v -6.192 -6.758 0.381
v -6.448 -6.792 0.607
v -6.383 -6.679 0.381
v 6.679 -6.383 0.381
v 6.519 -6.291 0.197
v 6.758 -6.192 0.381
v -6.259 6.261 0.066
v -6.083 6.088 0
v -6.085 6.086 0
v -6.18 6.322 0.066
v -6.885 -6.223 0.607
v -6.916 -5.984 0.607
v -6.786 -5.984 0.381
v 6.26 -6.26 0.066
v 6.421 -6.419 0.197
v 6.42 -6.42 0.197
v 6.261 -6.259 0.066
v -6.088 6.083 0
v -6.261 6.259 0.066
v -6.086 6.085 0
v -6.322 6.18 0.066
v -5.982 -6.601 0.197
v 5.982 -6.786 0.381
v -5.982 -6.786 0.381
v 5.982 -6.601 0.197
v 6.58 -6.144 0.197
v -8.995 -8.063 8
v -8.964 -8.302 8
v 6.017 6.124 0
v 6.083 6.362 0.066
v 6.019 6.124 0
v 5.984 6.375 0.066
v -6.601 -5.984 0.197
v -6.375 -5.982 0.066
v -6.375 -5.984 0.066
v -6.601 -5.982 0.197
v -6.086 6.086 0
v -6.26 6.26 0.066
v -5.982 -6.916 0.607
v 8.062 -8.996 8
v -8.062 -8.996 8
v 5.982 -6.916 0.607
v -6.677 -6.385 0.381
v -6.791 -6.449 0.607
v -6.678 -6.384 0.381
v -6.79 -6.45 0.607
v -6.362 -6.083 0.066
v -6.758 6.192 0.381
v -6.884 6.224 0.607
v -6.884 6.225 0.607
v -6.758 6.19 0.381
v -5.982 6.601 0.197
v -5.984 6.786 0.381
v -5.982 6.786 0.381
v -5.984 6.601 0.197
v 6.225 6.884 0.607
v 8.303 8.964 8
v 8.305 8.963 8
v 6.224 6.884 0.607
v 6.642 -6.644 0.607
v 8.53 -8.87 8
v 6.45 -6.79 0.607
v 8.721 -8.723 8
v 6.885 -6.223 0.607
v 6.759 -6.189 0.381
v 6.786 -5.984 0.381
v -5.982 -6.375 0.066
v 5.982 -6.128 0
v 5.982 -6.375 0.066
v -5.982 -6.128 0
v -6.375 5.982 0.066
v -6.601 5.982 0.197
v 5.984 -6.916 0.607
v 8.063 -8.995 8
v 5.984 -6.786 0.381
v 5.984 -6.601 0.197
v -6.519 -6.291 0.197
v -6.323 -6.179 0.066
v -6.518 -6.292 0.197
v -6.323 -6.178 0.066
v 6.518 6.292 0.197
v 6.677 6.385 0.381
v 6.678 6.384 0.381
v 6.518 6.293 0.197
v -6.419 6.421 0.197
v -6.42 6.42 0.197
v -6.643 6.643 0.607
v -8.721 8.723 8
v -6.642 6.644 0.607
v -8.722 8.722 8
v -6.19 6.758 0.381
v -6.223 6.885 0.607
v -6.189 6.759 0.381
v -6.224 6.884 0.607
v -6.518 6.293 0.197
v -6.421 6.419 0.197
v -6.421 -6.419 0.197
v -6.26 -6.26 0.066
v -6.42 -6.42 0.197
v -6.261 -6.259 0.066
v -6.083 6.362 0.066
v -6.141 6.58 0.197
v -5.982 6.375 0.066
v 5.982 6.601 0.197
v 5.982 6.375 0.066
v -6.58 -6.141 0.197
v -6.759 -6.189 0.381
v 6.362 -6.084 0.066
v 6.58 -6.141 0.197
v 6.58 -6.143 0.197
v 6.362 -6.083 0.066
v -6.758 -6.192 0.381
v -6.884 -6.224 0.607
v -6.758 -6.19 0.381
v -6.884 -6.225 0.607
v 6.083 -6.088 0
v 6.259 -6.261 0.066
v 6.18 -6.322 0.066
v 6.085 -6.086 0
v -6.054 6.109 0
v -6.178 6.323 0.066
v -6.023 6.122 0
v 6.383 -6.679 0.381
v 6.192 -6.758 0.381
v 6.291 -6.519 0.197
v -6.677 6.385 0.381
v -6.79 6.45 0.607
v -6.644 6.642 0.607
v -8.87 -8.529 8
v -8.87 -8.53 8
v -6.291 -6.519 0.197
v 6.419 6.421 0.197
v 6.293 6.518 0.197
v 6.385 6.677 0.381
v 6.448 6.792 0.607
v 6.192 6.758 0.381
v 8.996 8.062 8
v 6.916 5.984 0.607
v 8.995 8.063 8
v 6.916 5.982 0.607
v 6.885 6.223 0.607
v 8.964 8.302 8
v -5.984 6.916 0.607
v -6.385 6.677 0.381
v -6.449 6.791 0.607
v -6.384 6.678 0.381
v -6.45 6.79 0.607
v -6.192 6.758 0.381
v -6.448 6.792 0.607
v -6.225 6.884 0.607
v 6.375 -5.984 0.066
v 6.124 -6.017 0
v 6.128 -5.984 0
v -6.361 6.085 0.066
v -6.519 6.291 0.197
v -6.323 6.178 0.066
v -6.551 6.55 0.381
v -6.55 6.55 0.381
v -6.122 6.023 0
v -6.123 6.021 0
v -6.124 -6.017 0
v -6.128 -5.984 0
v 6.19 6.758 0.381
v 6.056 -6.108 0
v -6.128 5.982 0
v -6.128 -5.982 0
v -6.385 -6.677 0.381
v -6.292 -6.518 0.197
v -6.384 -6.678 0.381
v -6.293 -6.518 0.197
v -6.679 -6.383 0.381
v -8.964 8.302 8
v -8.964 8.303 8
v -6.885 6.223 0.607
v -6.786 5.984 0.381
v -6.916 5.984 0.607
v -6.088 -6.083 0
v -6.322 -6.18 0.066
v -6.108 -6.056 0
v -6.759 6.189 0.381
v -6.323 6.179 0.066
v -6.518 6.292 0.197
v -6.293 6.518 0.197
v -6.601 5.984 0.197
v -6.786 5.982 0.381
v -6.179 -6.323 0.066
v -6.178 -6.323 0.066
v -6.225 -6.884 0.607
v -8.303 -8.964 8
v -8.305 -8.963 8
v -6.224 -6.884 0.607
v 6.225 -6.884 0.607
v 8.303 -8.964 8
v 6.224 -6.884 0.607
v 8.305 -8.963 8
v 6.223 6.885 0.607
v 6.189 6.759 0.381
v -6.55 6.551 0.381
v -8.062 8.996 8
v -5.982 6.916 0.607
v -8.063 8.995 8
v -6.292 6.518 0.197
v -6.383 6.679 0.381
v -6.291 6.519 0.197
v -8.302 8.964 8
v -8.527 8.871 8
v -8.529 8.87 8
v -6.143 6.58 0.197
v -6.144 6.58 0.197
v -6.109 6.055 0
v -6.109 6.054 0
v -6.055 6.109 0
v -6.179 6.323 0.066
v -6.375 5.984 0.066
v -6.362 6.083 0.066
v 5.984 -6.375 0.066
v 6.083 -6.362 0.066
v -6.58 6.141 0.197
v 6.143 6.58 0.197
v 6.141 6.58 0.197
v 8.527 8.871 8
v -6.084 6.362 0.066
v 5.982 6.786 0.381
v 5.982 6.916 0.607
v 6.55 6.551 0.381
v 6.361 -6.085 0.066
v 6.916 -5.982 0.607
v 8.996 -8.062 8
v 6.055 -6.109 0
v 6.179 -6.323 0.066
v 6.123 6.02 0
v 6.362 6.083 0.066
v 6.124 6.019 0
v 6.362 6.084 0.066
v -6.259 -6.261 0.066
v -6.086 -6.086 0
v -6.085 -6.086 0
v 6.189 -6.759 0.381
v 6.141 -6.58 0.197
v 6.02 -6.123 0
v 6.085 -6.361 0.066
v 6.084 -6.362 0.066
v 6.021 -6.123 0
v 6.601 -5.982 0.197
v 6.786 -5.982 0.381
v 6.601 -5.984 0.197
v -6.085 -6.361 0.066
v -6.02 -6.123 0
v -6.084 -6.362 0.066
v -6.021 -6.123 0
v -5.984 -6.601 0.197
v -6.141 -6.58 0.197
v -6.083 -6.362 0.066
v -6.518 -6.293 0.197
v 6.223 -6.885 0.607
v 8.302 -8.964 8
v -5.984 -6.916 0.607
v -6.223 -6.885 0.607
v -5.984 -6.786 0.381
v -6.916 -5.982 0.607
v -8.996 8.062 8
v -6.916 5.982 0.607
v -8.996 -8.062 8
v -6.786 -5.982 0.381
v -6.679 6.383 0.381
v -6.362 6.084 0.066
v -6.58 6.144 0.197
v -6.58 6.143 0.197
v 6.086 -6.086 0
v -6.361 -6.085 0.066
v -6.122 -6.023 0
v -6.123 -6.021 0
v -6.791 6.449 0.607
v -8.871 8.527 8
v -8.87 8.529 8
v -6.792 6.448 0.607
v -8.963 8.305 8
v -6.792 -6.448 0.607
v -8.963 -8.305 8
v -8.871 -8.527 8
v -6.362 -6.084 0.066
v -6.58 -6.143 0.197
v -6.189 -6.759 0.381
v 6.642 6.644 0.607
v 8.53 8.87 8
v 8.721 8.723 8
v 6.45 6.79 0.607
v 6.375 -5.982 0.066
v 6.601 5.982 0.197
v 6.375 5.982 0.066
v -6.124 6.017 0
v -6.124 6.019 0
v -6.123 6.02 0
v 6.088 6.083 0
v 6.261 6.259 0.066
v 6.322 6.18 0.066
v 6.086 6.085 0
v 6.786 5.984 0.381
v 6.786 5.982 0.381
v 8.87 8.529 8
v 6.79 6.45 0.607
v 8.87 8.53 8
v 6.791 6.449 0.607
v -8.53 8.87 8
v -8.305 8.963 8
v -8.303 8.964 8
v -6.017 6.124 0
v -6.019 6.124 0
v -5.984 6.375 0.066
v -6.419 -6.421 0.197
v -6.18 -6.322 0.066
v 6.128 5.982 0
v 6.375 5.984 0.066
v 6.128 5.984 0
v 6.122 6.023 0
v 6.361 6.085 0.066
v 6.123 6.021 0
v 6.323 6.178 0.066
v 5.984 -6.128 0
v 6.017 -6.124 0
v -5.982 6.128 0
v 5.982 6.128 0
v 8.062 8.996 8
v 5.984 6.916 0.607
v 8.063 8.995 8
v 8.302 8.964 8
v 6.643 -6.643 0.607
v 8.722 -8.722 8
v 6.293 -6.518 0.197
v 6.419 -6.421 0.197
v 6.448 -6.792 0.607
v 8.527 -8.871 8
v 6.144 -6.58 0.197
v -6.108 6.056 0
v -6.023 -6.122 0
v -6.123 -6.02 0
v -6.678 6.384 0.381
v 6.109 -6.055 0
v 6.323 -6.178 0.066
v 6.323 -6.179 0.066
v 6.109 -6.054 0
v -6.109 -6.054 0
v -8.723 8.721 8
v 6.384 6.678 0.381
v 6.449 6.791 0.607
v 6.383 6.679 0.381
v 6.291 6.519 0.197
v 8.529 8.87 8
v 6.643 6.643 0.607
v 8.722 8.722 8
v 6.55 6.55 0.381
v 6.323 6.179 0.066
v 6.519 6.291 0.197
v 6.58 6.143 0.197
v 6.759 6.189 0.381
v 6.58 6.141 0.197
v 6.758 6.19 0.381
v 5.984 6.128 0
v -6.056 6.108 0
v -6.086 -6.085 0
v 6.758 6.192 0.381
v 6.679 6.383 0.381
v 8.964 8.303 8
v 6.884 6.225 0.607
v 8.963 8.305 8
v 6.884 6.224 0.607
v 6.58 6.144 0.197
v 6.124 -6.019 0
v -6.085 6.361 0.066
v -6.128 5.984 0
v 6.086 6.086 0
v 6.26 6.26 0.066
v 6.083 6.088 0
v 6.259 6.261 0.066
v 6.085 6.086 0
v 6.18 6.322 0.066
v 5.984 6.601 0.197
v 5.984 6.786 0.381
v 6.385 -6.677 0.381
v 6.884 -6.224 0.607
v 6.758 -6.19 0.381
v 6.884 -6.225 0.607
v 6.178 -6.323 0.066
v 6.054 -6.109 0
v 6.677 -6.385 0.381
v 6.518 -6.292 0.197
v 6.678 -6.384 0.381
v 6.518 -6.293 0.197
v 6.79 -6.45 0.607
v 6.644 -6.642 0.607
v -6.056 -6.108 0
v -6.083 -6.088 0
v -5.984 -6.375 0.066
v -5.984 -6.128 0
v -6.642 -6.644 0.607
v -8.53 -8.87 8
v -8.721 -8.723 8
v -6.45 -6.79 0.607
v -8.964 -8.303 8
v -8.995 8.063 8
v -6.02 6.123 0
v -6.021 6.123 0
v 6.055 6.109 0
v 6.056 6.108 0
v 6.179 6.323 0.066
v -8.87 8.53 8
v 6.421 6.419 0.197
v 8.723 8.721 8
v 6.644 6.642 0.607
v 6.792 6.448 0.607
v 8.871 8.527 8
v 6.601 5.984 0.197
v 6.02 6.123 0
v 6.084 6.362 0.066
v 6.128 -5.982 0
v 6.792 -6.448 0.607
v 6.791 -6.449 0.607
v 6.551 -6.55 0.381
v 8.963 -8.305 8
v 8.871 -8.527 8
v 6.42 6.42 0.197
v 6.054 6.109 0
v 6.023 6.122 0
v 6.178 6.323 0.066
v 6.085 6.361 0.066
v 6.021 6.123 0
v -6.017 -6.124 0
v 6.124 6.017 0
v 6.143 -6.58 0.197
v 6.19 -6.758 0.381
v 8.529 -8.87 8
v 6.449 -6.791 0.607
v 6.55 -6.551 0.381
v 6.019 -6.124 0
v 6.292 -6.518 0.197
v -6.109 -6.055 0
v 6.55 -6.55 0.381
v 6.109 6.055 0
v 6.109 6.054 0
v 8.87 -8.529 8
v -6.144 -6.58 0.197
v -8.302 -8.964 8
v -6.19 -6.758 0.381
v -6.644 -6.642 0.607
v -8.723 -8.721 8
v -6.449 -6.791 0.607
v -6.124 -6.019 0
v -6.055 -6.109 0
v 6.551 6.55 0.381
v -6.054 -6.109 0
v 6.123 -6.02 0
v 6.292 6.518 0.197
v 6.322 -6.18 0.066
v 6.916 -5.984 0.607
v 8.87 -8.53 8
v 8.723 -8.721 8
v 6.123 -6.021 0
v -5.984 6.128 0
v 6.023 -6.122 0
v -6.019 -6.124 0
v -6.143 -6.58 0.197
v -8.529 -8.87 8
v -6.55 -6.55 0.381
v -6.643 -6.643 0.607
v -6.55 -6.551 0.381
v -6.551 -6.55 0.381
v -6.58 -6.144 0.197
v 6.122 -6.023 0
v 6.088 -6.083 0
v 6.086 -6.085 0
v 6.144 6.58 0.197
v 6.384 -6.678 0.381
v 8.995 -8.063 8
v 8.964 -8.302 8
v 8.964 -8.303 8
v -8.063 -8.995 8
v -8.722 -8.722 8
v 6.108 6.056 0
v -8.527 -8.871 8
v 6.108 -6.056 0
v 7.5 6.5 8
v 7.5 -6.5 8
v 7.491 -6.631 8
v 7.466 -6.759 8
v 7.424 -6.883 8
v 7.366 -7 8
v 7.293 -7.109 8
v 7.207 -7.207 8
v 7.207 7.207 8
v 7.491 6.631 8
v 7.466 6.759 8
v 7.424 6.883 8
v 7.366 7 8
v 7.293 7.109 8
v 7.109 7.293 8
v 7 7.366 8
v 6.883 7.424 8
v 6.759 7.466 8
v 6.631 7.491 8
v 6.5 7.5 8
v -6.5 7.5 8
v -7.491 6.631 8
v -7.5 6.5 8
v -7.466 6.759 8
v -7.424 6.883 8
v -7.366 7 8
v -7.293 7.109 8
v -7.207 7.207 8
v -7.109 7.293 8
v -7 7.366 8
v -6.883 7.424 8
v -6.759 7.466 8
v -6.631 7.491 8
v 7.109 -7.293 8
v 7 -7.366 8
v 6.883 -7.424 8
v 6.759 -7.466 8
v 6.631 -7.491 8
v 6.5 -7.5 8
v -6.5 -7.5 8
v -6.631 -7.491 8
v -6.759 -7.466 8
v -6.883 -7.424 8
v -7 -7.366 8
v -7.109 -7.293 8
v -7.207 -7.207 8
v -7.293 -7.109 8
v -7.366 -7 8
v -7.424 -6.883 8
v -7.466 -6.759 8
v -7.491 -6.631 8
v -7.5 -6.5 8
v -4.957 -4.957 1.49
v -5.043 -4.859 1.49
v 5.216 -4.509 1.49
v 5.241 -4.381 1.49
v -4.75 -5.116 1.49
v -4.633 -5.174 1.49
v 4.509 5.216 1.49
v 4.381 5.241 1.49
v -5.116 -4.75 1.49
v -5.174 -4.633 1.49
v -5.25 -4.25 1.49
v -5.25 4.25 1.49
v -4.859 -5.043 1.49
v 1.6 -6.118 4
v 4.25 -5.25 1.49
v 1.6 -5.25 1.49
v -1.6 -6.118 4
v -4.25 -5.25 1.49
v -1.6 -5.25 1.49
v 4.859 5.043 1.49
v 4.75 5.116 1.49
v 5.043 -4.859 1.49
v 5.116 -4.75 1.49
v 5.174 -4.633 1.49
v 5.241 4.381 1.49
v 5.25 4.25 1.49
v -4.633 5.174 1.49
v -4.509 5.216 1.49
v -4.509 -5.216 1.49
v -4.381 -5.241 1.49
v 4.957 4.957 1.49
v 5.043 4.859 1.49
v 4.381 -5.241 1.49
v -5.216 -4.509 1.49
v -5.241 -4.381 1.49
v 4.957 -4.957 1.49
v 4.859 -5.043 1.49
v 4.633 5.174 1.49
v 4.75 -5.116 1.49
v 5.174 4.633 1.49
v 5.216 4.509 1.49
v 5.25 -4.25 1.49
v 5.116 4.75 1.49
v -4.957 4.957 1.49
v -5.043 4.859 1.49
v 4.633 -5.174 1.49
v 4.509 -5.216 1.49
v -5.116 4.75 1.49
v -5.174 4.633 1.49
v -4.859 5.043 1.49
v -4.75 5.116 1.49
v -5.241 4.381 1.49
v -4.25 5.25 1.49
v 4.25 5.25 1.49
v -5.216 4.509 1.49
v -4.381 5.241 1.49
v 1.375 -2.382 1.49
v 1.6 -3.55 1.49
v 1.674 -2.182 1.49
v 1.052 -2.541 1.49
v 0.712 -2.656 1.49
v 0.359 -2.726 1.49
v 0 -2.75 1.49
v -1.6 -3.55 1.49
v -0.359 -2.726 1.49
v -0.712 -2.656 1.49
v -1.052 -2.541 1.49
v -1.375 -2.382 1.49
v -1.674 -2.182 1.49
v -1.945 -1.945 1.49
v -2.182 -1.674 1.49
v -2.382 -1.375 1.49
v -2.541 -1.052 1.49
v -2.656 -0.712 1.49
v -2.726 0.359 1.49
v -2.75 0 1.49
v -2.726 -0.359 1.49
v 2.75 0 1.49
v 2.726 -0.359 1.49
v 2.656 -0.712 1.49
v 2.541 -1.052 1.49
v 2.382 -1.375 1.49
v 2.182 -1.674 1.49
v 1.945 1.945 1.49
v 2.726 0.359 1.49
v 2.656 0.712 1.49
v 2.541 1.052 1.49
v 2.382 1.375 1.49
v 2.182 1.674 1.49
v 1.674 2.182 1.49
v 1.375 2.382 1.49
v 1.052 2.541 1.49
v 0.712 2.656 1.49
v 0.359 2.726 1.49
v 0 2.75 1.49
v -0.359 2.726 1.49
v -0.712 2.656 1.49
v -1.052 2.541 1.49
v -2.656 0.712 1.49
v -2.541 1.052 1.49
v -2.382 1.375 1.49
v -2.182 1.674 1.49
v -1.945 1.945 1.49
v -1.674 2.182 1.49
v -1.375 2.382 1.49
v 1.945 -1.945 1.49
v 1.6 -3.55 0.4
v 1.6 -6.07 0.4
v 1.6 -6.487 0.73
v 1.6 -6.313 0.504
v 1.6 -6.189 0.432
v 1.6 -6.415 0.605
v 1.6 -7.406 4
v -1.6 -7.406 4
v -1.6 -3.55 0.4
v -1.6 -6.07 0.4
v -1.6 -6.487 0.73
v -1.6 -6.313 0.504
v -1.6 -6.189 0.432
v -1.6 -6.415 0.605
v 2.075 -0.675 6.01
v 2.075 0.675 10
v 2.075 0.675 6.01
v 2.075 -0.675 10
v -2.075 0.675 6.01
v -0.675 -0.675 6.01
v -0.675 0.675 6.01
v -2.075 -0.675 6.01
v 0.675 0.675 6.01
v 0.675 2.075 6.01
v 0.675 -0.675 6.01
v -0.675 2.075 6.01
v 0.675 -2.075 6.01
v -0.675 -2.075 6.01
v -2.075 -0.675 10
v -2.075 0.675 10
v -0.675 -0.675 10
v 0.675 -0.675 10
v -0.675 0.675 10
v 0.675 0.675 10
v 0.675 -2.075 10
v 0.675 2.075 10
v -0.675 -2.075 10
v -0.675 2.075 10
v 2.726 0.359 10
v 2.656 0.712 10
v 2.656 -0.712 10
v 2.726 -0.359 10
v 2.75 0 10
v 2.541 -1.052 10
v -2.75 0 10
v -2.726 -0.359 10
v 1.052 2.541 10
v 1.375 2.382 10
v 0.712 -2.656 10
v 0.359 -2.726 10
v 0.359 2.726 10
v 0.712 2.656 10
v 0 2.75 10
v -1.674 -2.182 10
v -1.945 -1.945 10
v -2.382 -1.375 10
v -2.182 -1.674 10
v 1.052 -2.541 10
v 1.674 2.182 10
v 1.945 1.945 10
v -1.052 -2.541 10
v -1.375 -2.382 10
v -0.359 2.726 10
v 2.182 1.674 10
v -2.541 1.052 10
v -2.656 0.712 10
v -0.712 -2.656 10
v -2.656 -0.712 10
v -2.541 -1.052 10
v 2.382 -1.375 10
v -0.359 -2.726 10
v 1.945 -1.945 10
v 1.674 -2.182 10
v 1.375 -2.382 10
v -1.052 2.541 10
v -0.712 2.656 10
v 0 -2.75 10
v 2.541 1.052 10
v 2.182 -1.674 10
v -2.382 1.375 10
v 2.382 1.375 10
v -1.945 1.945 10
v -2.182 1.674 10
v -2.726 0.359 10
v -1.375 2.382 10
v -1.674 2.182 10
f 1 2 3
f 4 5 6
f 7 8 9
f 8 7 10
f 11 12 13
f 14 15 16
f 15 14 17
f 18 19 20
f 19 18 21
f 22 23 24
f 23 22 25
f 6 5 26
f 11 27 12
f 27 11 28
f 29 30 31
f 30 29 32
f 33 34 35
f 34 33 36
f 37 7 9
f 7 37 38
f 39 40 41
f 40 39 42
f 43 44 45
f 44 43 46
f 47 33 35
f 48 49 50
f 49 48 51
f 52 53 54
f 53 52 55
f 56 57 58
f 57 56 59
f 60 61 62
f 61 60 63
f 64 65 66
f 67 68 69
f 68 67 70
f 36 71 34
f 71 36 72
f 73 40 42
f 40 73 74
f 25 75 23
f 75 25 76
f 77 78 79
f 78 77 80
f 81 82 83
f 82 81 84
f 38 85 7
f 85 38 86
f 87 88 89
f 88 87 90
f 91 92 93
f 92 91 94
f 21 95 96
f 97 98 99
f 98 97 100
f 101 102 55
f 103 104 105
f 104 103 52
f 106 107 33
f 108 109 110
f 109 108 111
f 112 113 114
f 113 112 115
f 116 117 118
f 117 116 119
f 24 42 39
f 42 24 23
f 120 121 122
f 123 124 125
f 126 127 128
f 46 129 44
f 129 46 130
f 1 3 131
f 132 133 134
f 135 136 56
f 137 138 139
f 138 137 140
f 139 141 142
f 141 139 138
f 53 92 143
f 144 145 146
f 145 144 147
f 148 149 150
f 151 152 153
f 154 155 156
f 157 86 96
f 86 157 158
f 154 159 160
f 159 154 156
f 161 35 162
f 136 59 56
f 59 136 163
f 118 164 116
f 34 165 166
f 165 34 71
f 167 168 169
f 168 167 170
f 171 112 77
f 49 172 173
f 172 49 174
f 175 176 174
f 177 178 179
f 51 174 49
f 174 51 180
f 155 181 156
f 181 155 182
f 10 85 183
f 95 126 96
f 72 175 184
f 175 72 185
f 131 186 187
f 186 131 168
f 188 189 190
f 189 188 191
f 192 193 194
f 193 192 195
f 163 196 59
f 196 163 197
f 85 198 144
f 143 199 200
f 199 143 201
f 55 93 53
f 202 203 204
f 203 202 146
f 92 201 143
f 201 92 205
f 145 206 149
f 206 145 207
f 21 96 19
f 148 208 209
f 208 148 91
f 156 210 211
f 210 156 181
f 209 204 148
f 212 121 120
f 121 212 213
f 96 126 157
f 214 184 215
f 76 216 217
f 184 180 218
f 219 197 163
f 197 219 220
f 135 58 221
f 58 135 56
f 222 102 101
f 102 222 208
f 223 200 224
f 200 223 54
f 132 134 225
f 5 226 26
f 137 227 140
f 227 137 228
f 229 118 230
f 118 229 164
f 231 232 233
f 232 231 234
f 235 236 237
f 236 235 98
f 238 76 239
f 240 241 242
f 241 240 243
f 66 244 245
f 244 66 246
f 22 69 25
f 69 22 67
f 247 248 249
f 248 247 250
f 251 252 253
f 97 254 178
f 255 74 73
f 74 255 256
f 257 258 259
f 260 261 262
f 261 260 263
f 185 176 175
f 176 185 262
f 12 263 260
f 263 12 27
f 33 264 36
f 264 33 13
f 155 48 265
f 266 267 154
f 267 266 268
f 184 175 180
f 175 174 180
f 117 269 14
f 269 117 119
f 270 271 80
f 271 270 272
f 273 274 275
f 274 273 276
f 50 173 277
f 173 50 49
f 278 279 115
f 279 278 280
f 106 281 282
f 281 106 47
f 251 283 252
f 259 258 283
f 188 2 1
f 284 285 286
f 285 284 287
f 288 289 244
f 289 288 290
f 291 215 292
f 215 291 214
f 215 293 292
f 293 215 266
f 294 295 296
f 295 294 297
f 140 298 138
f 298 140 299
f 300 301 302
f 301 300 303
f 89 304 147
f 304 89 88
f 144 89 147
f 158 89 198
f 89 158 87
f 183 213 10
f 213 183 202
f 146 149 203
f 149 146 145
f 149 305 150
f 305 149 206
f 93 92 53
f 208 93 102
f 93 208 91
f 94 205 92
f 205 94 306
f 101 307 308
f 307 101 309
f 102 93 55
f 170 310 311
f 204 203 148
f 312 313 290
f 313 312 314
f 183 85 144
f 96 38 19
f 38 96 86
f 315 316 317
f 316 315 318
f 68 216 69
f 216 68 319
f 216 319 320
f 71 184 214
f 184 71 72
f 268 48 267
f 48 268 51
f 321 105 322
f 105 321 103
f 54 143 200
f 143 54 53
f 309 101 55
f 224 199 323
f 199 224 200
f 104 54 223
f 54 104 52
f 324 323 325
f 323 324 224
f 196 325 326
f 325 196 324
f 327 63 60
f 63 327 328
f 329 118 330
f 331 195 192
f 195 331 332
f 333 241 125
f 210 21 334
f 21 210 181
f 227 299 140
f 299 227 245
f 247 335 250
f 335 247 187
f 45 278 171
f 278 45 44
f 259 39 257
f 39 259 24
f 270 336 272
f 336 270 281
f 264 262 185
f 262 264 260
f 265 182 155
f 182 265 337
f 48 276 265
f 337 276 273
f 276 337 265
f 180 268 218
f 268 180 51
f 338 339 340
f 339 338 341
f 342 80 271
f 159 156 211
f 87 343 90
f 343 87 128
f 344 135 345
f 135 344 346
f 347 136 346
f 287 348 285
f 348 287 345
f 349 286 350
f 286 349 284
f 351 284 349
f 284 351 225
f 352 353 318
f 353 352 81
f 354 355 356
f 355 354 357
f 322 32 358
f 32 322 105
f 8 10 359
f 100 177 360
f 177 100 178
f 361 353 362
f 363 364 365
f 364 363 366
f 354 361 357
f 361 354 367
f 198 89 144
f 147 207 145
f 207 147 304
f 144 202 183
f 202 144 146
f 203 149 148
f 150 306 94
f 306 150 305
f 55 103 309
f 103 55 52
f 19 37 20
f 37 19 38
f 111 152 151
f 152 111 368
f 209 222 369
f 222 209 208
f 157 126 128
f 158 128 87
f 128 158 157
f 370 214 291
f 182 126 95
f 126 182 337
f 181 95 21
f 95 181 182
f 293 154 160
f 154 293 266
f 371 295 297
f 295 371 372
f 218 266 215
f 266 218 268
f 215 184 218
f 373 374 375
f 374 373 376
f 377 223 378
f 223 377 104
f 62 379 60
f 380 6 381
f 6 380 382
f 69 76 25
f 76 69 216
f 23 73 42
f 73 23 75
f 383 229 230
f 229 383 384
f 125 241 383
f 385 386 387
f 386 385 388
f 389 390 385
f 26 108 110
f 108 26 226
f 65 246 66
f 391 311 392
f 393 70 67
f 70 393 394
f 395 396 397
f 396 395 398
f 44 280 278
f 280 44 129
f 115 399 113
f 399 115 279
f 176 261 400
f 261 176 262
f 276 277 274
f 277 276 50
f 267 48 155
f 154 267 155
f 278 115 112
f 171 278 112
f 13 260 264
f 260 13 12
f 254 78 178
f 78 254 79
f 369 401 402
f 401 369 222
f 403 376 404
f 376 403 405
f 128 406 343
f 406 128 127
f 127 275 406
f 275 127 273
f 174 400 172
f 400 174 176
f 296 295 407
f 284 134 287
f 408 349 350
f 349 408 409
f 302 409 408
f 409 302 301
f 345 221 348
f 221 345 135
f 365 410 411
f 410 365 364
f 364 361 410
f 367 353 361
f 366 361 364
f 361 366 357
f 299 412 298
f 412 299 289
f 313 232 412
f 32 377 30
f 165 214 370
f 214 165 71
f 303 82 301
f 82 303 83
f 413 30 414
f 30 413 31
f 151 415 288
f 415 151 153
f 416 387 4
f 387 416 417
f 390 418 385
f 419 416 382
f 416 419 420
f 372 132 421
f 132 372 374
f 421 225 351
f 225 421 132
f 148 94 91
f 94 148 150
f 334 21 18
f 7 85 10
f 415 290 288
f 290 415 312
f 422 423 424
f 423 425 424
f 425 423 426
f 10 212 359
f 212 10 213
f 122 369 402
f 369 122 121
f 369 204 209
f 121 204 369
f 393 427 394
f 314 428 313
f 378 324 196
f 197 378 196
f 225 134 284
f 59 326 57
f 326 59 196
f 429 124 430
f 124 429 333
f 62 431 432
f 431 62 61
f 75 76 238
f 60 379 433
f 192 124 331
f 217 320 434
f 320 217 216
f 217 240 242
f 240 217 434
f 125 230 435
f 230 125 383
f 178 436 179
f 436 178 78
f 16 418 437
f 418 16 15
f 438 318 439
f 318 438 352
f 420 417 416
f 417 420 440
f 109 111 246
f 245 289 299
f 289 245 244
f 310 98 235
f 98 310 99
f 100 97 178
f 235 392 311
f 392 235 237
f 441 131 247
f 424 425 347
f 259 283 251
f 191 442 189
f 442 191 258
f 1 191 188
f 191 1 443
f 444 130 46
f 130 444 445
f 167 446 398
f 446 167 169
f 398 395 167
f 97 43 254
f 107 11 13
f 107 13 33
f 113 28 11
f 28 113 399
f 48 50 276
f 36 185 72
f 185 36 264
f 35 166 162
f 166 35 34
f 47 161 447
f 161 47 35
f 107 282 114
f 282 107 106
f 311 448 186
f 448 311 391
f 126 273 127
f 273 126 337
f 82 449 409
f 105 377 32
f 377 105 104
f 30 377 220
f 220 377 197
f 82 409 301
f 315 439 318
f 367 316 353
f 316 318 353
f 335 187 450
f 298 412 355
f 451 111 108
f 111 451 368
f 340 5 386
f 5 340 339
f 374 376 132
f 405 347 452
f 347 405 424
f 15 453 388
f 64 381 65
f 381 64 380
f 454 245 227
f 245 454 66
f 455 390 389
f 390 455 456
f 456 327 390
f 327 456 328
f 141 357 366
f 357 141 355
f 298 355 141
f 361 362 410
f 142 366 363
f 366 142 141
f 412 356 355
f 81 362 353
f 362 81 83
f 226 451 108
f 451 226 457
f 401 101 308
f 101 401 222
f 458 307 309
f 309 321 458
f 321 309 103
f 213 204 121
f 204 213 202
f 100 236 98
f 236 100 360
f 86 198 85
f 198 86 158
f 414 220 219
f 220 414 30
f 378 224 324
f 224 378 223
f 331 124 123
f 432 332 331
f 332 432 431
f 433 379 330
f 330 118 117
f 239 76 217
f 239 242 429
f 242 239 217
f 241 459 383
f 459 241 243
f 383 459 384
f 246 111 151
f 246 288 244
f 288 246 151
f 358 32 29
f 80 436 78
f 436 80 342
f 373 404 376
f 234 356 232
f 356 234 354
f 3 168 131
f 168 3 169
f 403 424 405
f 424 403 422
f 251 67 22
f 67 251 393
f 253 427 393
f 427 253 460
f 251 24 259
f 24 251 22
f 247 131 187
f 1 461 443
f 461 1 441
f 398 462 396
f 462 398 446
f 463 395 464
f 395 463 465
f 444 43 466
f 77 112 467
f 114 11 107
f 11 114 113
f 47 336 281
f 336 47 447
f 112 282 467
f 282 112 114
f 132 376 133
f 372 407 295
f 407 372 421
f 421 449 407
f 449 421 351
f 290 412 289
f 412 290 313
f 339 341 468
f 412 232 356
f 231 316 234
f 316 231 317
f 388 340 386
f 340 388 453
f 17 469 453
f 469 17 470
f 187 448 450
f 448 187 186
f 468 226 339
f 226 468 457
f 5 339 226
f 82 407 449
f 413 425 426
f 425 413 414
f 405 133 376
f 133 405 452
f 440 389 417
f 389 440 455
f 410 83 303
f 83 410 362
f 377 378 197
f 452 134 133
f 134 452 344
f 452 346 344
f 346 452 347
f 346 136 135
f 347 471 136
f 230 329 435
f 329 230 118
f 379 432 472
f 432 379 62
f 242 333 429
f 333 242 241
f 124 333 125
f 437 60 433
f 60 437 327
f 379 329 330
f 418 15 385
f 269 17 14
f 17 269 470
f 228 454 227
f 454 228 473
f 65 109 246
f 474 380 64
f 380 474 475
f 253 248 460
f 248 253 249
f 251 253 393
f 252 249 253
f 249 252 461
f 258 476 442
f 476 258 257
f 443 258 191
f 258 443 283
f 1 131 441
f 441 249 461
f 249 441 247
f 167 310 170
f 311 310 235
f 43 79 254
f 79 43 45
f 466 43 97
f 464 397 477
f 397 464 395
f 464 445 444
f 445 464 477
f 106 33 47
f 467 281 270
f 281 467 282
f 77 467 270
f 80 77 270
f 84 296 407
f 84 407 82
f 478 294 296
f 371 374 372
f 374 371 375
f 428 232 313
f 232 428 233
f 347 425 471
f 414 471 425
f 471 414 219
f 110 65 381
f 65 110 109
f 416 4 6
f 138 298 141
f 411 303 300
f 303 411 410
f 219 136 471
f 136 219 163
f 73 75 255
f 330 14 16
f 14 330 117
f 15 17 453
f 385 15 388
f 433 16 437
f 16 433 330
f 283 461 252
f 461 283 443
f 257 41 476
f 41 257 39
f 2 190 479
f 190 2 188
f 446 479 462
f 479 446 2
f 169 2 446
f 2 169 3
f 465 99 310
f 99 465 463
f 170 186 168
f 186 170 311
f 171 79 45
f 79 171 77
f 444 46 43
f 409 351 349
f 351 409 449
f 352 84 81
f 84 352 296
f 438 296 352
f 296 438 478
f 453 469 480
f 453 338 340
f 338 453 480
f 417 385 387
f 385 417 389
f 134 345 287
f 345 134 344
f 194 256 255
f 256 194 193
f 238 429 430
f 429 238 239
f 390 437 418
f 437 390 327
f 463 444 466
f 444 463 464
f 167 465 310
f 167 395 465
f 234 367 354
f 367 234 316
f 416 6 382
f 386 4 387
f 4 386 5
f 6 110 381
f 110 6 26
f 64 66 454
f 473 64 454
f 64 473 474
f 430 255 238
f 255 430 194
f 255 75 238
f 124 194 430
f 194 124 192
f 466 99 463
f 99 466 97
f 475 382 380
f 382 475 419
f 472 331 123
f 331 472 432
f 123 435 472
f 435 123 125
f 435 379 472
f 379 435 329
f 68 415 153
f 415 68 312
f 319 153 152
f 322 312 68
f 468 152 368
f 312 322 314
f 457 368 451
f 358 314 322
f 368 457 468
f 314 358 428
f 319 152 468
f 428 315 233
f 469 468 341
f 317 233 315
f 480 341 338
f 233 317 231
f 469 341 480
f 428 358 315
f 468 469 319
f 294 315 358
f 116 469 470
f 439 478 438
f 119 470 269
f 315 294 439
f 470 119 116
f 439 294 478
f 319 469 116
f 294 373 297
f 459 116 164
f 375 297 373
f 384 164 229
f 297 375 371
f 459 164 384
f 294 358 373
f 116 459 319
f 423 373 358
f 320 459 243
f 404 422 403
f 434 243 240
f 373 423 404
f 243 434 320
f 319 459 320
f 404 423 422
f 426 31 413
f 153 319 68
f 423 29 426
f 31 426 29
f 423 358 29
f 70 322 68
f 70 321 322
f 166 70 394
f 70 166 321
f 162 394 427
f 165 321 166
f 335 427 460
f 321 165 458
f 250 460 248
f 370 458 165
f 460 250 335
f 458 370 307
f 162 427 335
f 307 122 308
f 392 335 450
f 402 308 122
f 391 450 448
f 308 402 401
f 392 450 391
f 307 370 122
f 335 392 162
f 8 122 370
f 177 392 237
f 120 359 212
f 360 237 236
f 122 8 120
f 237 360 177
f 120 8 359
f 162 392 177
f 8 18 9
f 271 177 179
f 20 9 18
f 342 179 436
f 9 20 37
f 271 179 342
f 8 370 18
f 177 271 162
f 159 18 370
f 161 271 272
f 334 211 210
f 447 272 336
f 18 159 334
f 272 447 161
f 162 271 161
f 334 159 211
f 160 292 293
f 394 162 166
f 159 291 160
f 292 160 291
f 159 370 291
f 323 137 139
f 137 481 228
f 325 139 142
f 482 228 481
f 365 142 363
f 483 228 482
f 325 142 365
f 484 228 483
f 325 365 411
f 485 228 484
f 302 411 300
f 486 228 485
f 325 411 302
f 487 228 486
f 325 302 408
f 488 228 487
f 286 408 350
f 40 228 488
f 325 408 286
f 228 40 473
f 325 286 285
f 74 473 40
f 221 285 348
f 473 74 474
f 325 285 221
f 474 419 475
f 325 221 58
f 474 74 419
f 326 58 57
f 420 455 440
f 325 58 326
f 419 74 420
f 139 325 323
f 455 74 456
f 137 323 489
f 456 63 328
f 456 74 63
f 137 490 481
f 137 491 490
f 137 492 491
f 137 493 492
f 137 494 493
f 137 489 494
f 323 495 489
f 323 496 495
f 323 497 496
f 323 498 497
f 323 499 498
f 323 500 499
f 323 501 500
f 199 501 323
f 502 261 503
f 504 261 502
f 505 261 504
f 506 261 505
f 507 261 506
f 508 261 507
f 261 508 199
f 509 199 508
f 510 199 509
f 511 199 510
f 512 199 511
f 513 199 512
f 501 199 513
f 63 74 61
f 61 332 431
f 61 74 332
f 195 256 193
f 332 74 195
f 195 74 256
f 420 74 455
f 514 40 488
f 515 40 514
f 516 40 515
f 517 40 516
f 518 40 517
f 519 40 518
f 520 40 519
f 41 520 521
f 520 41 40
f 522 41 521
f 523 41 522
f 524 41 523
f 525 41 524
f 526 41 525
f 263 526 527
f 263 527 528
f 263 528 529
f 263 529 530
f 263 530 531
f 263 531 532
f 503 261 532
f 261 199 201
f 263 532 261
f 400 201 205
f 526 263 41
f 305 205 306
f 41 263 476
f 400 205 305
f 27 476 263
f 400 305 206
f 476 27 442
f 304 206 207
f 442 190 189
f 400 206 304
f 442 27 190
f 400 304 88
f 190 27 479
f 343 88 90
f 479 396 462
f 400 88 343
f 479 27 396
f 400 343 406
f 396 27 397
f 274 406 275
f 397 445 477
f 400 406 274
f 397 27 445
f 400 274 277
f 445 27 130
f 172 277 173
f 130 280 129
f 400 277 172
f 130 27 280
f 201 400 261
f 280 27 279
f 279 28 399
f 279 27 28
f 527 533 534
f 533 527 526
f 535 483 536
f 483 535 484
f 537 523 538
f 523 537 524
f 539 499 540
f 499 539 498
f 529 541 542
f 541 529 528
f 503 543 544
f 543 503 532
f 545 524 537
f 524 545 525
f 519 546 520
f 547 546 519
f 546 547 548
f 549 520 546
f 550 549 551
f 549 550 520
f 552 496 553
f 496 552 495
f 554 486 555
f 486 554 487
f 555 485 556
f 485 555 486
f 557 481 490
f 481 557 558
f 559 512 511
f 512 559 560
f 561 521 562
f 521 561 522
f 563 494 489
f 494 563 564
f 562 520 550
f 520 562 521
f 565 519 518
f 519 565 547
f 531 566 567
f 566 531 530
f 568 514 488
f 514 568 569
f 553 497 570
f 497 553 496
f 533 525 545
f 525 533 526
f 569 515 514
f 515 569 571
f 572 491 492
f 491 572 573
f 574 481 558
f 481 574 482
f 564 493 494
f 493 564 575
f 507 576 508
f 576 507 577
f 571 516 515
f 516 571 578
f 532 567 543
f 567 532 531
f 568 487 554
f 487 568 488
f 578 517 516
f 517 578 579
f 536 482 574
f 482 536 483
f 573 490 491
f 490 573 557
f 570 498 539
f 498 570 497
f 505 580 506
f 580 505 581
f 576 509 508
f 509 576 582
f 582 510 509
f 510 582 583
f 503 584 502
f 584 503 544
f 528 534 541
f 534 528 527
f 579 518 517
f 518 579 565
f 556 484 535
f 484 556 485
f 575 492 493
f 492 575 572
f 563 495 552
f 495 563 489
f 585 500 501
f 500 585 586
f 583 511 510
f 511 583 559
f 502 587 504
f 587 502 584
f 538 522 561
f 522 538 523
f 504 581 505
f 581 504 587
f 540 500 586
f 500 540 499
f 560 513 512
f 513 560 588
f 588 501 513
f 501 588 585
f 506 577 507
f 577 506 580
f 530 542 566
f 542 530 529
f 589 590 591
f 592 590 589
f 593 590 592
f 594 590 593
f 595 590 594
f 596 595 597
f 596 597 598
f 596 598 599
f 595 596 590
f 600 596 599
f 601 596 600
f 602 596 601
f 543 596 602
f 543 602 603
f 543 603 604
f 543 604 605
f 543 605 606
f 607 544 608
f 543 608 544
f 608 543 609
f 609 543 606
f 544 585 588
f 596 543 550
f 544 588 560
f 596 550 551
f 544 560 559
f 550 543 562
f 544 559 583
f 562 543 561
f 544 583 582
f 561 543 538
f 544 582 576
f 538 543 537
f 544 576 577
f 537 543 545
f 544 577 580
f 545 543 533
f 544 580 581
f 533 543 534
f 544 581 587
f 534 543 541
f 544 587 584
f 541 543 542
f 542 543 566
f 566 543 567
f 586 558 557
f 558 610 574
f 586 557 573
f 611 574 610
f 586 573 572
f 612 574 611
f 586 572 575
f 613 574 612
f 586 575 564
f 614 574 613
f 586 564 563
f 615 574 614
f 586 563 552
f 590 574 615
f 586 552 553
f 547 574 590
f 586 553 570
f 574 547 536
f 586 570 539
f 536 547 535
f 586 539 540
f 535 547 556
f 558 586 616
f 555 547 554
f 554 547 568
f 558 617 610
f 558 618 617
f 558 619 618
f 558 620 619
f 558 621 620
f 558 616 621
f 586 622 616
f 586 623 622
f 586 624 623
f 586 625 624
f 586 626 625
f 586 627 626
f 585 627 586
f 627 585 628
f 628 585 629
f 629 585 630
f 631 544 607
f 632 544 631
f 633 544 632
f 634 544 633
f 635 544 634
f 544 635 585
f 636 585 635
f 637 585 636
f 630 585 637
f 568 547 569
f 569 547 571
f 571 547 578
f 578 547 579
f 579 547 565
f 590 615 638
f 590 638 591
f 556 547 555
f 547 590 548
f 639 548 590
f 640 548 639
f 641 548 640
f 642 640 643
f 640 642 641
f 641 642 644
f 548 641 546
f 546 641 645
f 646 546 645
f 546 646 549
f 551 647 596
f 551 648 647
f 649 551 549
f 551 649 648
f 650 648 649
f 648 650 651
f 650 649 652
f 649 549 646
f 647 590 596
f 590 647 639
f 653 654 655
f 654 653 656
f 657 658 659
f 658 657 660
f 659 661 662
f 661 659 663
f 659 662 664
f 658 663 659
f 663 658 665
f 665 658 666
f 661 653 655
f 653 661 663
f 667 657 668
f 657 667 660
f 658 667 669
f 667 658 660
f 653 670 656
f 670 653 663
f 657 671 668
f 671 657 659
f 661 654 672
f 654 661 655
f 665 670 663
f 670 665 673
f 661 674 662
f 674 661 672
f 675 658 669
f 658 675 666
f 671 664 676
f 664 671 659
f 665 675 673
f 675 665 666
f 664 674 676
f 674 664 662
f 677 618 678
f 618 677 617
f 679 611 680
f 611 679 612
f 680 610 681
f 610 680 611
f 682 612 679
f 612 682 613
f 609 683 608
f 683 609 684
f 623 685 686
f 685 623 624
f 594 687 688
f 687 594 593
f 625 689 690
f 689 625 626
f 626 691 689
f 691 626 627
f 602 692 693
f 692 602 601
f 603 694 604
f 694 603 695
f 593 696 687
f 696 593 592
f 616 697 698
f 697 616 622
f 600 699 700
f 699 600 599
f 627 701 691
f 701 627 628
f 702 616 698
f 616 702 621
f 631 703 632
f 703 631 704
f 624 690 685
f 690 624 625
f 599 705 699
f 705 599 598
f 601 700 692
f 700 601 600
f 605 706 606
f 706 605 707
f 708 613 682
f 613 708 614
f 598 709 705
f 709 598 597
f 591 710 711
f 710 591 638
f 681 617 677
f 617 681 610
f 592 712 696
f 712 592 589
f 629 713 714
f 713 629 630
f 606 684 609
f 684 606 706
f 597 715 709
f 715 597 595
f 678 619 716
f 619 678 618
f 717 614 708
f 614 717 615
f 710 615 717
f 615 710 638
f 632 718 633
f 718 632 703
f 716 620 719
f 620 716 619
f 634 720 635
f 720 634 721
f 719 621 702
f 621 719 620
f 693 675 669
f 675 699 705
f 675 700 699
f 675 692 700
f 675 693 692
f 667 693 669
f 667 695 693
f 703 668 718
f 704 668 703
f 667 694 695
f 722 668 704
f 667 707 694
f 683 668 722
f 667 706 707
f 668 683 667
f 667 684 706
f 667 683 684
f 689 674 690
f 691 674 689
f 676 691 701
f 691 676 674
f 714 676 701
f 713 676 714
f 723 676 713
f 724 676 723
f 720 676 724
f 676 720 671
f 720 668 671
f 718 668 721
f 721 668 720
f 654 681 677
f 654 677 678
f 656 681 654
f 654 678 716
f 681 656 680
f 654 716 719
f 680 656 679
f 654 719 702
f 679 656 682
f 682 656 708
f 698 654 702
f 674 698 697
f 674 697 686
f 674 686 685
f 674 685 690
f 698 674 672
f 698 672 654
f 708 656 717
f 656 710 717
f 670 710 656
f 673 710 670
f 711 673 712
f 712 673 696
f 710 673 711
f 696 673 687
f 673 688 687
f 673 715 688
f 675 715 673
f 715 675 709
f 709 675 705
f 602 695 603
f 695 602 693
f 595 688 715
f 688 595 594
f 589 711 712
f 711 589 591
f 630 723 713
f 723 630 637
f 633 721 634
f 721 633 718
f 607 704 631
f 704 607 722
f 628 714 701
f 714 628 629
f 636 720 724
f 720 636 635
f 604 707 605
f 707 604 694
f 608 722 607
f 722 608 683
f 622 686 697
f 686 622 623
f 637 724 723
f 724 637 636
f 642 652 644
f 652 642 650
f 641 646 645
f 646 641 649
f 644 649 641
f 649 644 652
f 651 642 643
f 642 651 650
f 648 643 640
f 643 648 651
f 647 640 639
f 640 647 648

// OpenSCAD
// Parametrische MX-Keycap mit seitlichem LED-Fenster und verlängertem Stem
// Druck: Oberseite nach unten aufs Bett legen (Stem zeigt nach oben).
//
// part = "body"   -> Kappe (Fenster ausgespart)
// part = "insert" -> nur das Fenster-Stück (in klarem/weißem Filament drucken)
// part = "both"   -> beides zusammen (Vorschau)
// Multi-Material: body + insert als zwei Teile eines Objekts in den Slicer laden.
// Ohne Multi-Material: nur "body" drucken -> Fenster bleibt offen.


// EXPORT:
// openscad -o keycap_body.stl   -D 'part="body"'   keycap.scad
// openscad -o keycap_insert.stl -D 'part="insert"' keycap.scad

part = "both"; // [both, body, insert]

$fn = 48;

/* [Außenform] */
bottom     = 18.0;  // Kantenlänge unten (mm)  – bitte nachmessen
top        = 13.5;  // Kantenlänge Oberseite (mm) – bitte nachmessen
height     = 8.0;   // Höhe Unterkante Rand bis Oberseite (mm)
corner_r   = 1.0;   // Eckenradius
wall       = 1.5;   // Wandstärke
top_thick  = 1.5;   // Deckelstärke
top_r      = 1.0;   // Rundung Kante Oberseite/Schrägen (0 = eckig, max. ~corner_r)

/* [Fenster (an +Y-Kante)] */
win_w      = 3.2;   // Breite des Streifens
win_in     = 3.2;   // wie weit es in die Oberseite reicht (ab Oberkante der Schräge)
win_frac   = 0.5;   // Anteil der Wandhöhe (von oben), den das Fenster abdeckt (1 = ganze Wand)
win_z0     = height * (1 - win_frac);
win_top    = 0.4;   // Dicke des Fensters auf der Oberseite (Lagen: 0.2 = 1 Lage bei 0.2er Schichthöhe)
win_side   = 0.45;  // Dicke des Fensters an der Seitenwand (≈ 1 Linienbreite)

/* [Stem] */
stem_extra  = 2.0;   // wie weit der Stem unter den Rand hinausragt (mm)
stem_d      = 5.5;   // Außendurchmesser Stem-Zylinder
cross_len   = 4.15;  // Länge der Kreuzarme (MX: 4.0 + Toleranz)
cross_w     = 1.35;  // Breite der Kreuzarme (MX: 1.17–1.3 + Toleranz)
cross_depth = 4.0;   // Tiefe des Kreuzlochs

module rsq(s, cr = corner_r) offset(r = cr) square(s - 2*cr, center = true);

slope = (bottom - top) / 2 / height;   // Einzug pro mm Höhe

// Kegelstumpf mit Unterkante b, Höhe h, Oberkante oben mit Radius r verrundet
module rounded_frustum(b, h, r, c = corner_r) {
    if (r <= 0) frustum(b, b - 2*slope*h, h, 0, c);
    else {
        sh = r * sqrt(1 + slope*slope);     // horizontaler Versatz der Schräge
        cr = max(c - r, 0.01);
        intersection() {
            minkowski() {
                hull() {
                    translate([0, 0, -r])
                        linear_extrude(0.01) rsq(2*(b/2 - sh + slope*r), cr);
                    translate([0, 0, h - r])
                        linear_extrude(0.01) rsq(2*(b/2 - sh - slope*(h - r)), cr);
                }
                sphere(r = r, $fn = 24);
            }
            translate([-b, -b, 0]) cube([2*b, 2*b, h]);
        }
    }
}

module outer() rounded_frustum(bottom, height, top_r);

// Außenform, um die Fensterdicke nach innen versetzt
module skin_inner() {
    s = win_side * sqrt(1 + slope*slope);
    rounded_frustum(bottom - 2*s, height - win_top,
                    max(top_r - win_side, 0), max(corner_r - s, 0.01));
}

module frustum(b, t, h, z0 = 0, c = corner_r)
    hull() {
        translate([0, 0, z0])     linear_extrude(0.01) rsq(b, c);
        translate([0, 0, z0 + h]) linear_extrude(0.01) rsq(t, c);
    }

module cavity()
    frustum(bottom - 2*wall, top - 2*wall, height - top_thick + 0.01, -0.01);

module stem()
    difference() {
        translate([0, 0, -stem_extra])
            cylinder(d = stem_d, h = stem_extra + height - top_thick + 0.01);
        translate([0, 0, -stem_extra - 0.01]) {
            translate([-cross_len/2, -cross_w/2, 0]) cube([cross_len, cross_w, cross_depth]);
            translate([-cross_w/2, -cross_len/2, 0]) cube([cross_w, cross_len, cross_depth]);
        }
    }

module solid() difference() { outer(); cavity(); }

module win_region()
    translate([-win_w/2, top/2 - win_in, win_z0])
        cube([win_w, bottom, height + 1]);

module body()   union() { difference() { solid(); win_region(); } stem(); }
module insert() difference() { intersection() { solid(); win_region(); } skin_inner(); }

translate([0, 0, height]) rotate([180, 0, 0]) {
    if (part == "body"   || part == "both") color("dimgray") body();
    if (part == "insert" || part == "both") color("white", 0.7) insert();
}
